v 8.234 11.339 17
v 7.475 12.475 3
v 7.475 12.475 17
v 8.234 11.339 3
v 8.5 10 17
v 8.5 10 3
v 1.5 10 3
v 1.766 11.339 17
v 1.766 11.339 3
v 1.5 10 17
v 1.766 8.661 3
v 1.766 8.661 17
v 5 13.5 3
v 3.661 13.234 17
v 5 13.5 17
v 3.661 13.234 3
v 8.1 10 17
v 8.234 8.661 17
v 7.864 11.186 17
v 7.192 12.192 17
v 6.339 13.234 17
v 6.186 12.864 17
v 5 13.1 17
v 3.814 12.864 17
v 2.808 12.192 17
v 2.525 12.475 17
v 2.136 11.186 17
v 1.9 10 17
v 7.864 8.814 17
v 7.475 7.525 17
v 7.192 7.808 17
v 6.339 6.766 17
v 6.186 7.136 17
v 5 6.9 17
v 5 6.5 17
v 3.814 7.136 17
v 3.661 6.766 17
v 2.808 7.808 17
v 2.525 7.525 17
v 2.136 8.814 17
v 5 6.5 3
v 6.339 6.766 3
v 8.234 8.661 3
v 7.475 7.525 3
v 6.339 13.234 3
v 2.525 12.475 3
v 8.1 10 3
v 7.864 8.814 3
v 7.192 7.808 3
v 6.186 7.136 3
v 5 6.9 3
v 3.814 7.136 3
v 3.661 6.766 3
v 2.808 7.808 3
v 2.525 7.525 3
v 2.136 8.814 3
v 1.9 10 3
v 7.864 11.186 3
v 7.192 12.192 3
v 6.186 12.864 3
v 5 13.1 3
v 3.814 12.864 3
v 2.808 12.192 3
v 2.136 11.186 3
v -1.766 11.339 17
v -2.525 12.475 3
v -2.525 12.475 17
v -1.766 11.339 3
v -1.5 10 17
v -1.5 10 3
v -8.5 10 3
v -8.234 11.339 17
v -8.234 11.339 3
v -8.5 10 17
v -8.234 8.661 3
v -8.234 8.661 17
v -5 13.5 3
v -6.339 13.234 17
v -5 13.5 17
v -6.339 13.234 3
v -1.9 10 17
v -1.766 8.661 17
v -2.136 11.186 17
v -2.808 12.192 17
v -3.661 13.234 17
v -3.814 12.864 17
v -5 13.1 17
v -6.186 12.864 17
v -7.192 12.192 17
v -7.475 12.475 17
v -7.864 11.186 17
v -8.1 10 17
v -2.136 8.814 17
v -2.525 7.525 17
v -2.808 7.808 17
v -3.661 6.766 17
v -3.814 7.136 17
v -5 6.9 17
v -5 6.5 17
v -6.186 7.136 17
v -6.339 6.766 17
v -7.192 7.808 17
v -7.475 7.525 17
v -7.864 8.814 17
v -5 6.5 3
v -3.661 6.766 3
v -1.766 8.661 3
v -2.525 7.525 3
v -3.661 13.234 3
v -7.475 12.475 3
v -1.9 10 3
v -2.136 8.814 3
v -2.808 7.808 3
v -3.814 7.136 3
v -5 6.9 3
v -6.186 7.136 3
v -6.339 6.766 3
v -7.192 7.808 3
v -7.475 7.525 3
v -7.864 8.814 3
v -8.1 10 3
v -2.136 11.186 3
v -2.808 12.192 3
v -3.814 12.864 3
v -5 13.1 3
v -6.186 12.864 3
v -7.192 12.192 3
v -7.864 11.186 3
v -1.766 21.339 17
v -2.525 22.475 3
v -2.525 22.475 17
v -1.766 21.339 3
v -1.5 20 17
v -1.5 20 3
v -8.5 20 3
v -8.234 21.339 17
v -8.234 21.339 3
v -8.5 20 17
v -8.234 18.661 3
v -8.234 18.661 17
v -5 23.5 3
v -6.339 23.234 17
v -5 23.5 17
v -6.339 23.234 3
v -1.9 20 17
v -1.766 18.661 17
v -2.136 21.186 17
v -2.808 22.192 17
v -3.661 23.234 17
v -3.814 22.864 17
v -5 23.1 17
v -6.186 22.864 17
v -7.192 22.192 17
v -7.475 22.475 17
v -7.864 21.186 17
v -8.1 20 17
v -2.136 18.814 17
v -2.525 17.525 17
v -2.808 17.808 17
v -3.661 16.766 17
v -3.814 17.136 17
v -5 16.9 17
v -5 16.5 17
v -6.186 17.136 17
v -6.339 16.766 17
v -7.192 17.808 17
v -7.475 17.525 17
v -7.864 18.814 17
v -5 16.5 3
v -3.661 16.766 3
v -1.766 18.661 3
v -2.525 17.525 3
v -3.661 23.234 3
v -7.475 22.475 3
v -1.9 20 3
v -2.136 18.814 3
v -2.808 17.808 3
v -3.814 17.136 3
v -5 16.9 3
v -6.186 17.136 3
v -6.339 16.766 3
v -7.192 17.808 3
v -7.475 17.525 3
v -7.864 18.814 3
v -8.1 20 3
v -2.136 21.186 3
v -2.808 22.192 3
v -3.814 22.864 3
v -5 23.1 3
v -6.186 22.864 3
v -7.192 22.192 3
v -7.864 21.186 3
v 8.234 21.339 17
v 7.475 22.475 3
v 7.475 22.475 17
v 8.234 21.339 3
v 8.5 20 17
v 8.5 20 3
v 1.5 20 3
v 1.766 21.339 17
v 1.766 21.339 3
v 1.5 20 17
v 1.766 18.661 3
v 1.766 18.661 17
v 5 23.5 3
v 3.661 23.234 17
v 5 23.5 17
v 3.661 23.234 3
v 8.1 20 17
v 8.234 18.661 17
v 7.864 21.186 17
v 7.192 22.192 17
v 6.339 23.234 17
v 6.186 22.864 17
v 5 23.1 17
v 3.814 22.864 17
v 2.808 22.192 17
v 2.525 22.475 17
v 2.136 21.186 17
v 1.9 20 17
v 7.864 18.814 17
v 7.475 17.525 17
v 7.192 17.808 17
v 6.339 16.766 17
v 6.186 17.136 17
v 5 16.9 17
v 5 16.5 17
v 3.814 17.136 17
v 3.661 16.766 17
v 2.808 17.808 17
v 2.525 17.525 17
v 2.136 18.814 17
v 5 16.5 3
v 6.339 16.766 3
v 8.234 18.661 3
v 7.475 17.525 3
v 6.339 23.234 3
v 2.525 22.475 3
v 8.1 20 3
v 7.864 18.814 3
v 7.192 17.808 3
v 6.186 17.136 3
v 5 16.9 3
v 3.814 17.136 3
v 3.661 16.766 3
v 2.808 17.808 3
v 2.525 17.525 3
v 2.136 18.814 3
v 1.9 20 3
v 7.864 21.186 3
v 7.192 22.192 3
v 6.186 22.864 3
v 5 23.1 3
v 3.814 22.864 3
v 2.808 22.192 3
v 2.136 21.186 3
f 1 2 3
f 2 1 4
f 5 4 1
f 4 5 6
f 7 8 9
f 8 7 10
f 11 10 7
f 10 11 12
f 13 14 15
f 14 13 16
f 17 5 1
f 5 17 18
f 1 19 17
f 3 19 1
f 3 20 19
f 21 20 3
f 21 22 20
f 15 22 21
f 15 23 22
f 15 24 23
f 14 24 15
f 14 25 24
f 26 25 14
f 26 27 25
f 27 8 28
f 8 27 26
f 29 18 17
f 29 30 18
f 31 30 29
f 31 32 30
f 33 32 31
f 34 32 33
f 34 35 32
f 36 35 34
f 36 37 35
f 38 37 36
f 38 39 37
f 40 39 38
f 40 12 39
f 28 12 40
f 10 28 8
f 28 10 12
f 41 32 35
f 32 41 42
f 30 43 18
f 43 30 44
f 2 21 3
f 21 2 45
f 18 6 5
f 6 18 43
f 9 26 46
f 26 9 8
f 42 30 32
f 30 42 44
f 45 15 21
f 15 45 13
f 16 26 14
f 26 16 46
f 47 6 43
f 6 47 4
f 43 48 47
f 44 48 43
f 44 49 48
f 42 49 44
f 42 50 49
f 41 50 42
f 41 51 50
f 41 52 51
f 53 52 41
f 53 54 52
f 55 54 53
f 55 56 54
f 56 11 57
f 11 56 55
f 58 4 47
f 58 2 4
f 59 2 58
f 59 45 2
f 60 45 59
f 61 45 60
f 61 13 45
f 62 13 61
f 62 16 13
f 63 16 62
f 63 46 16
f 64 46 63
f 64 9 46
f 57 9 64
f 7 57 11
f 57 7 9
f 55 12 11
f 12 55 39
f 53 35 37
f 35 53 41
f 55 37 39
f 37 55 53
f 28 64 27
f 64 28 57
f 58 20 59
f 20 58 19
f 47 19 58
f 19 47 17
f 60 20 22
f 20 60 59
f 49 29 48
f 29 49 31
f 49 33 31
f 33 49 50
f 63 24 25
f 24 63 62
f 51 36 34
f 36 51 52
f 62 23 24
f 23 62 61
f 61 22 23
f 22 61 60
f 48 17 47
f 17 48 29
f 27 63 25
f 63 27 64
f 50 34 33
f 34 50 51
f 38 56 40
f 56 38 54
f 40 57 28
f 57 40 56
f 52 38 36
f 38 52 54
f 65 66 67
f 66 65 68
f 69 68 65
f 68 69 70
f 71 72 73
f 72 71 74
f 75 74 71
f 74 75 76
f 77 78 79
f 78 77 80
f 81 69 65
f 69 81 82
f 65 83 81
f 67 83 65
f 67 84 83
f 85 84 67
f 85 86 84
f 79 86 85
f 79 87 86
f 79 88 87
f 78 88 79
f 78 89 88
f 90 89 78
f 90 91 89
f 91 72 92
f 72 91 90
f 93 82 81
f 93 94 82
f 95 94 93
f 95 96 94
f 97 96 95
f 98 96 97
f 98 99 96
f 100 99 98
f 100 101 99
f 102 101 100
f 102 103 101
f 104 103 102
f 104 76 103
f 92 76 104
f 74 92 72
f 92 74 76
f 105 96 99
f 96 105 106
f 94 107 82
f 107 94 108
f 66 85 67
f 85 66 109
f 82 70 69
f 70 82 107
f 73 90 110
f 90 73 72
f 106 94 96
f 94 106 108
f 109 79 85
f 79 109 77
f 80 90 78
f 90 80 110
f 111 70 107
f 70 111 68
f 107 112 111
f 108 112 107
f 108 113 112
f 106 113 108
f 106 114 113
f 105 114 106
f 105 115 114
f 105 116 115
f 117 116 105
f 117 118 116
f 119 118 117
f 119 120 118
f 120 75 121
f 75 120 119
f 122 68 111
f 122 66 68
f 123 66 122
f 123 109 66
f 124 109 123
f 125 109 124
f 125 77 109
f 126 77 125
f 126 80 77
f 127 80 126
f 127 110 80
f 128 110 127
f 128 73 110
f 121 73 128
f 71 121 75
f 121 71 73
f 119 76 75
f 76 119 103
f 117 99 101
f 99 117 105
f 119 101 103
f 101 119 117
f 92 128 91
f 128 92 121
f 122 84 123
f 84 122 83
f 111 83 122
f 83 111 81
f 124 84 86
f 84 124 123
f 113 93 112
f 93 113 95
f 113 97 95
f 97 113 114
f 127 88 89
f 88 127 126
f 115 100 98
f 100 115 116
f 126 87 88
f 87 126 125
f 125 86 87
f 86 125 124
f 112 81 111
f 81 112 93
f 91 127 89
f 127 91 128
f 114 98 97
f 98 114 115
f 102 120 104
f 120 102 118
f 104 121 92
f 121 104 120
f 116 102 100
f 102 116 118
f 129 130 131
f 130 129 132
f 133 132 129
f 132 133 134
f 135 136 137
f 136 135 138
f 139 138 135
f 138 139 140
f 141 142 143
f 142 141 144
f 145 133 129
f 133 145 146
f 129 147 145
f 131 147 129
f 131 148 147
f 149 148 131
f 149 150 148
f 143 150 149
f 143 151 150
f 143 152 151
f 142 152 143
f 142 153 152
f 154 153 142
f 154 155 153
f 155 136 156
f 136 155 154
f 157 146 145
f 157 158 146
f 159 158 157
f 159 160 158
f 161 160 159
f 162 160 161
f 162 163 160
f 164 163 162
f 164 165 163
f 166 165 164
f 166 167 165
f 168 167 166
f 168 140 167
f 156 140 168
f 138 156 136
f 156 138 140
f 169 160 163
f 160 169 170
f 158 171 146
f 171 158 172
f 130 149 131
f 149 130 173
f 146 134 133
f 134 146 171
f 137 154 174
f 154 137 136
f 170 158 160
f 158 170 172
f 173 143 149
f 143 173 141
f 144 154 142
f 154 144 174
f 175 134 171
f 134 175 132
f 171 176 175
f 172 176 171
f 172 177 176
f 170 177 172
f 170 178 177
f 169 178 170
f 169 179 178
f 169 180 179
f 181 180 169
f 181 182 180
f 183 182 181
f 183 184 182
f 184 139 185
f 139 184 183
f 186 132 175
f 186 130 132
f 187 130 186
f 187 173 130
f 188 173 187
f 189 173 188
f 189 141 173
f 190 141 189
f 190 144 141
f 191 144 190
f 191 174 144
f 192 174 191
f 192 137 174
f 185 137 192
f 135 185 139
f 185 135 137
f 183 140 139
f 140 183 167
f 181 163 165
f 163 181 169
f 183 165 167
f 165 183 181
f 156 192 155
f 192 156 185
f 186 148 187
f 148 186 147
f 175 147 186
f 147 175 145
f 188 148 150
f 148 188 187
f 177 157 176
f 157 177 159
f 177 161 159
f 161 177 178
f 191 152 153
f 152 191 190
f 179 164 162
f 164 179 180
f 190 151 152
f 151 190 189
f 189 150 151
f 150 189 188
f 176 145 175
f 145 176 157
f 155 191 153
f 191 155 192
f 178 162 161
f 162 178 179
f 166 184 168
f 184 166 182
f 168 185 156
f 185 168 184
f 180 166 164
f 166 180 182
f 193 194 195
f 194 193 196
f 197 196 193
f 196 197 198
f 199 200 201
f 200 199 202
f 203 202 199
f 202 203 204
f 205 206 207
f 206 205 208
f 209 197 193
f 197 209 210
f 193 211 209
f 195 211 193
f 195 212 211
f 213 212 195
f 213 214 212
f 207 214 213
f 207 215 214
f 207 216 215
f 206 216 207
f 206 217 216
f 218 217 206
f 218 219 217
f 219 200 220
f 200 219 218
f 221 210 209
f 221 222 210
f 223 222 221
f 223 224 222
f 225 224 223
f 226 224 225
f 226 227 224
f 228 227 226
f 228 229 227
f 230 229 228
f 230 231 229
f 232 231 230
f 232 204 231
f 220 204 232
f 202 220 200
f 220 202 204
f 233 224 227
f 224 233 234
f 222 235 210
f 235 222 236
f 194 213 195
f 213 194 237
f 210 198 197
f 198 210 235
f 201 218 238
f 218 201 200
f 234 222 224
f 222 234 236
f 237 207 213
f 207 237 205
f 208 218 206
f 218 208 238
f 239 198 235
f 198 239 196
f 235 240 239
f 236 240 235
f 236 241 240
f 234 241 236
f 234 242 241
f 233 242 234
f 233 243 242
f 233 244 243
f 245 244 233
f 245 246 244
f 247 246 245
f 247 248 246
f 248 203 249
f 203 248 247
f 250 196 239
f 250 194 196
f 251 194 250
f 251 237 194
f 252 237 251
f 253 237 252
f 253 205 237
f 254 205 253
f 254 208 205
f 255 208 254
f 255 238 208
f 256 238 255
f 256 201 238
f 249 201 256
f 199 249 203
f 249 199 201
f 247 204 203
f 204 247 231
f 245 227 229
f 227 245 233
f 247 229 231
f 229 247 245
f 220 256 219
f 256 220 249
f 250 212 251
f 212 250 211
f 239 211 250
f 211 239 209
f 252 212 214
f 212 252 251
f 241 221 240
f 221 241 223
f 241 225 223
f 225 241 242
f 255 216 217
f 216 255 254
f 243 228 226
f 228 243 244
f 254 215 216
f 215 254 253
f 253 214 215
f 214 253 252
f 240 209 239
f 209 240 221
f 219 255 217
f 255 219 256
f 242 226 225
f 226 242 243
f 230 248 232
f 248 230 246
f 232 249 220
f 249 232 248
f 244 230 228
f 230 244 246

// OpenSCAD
diametro_agujero = 6.2;
altura_agujero = 17;
diametro_cilindro = 7;
altura_cilindro = 14;

translate([5,10,10])
vaciarCilindroInterior();
translate([-5,10,10])
vaciarCilindroInterior();

translate([-5,20,10])
vaciarCilindroInterior();

translate([5,20,10])
vaciarCilindroInterior();

module crearCilindroExterior(){
cylinder(h=altura_cilindro,d=diametro_cilindro,center = true,$fn=16);
}

module crearCilindroInterior(){
cylinder(h=altura_agujero,d=diametro_agujero,center = true,$fn=16);
}

module vaciarCilindroInterior(){
    difference(){
        crearCilindroExterior();
        crearCilindroInterior();
    }
}
